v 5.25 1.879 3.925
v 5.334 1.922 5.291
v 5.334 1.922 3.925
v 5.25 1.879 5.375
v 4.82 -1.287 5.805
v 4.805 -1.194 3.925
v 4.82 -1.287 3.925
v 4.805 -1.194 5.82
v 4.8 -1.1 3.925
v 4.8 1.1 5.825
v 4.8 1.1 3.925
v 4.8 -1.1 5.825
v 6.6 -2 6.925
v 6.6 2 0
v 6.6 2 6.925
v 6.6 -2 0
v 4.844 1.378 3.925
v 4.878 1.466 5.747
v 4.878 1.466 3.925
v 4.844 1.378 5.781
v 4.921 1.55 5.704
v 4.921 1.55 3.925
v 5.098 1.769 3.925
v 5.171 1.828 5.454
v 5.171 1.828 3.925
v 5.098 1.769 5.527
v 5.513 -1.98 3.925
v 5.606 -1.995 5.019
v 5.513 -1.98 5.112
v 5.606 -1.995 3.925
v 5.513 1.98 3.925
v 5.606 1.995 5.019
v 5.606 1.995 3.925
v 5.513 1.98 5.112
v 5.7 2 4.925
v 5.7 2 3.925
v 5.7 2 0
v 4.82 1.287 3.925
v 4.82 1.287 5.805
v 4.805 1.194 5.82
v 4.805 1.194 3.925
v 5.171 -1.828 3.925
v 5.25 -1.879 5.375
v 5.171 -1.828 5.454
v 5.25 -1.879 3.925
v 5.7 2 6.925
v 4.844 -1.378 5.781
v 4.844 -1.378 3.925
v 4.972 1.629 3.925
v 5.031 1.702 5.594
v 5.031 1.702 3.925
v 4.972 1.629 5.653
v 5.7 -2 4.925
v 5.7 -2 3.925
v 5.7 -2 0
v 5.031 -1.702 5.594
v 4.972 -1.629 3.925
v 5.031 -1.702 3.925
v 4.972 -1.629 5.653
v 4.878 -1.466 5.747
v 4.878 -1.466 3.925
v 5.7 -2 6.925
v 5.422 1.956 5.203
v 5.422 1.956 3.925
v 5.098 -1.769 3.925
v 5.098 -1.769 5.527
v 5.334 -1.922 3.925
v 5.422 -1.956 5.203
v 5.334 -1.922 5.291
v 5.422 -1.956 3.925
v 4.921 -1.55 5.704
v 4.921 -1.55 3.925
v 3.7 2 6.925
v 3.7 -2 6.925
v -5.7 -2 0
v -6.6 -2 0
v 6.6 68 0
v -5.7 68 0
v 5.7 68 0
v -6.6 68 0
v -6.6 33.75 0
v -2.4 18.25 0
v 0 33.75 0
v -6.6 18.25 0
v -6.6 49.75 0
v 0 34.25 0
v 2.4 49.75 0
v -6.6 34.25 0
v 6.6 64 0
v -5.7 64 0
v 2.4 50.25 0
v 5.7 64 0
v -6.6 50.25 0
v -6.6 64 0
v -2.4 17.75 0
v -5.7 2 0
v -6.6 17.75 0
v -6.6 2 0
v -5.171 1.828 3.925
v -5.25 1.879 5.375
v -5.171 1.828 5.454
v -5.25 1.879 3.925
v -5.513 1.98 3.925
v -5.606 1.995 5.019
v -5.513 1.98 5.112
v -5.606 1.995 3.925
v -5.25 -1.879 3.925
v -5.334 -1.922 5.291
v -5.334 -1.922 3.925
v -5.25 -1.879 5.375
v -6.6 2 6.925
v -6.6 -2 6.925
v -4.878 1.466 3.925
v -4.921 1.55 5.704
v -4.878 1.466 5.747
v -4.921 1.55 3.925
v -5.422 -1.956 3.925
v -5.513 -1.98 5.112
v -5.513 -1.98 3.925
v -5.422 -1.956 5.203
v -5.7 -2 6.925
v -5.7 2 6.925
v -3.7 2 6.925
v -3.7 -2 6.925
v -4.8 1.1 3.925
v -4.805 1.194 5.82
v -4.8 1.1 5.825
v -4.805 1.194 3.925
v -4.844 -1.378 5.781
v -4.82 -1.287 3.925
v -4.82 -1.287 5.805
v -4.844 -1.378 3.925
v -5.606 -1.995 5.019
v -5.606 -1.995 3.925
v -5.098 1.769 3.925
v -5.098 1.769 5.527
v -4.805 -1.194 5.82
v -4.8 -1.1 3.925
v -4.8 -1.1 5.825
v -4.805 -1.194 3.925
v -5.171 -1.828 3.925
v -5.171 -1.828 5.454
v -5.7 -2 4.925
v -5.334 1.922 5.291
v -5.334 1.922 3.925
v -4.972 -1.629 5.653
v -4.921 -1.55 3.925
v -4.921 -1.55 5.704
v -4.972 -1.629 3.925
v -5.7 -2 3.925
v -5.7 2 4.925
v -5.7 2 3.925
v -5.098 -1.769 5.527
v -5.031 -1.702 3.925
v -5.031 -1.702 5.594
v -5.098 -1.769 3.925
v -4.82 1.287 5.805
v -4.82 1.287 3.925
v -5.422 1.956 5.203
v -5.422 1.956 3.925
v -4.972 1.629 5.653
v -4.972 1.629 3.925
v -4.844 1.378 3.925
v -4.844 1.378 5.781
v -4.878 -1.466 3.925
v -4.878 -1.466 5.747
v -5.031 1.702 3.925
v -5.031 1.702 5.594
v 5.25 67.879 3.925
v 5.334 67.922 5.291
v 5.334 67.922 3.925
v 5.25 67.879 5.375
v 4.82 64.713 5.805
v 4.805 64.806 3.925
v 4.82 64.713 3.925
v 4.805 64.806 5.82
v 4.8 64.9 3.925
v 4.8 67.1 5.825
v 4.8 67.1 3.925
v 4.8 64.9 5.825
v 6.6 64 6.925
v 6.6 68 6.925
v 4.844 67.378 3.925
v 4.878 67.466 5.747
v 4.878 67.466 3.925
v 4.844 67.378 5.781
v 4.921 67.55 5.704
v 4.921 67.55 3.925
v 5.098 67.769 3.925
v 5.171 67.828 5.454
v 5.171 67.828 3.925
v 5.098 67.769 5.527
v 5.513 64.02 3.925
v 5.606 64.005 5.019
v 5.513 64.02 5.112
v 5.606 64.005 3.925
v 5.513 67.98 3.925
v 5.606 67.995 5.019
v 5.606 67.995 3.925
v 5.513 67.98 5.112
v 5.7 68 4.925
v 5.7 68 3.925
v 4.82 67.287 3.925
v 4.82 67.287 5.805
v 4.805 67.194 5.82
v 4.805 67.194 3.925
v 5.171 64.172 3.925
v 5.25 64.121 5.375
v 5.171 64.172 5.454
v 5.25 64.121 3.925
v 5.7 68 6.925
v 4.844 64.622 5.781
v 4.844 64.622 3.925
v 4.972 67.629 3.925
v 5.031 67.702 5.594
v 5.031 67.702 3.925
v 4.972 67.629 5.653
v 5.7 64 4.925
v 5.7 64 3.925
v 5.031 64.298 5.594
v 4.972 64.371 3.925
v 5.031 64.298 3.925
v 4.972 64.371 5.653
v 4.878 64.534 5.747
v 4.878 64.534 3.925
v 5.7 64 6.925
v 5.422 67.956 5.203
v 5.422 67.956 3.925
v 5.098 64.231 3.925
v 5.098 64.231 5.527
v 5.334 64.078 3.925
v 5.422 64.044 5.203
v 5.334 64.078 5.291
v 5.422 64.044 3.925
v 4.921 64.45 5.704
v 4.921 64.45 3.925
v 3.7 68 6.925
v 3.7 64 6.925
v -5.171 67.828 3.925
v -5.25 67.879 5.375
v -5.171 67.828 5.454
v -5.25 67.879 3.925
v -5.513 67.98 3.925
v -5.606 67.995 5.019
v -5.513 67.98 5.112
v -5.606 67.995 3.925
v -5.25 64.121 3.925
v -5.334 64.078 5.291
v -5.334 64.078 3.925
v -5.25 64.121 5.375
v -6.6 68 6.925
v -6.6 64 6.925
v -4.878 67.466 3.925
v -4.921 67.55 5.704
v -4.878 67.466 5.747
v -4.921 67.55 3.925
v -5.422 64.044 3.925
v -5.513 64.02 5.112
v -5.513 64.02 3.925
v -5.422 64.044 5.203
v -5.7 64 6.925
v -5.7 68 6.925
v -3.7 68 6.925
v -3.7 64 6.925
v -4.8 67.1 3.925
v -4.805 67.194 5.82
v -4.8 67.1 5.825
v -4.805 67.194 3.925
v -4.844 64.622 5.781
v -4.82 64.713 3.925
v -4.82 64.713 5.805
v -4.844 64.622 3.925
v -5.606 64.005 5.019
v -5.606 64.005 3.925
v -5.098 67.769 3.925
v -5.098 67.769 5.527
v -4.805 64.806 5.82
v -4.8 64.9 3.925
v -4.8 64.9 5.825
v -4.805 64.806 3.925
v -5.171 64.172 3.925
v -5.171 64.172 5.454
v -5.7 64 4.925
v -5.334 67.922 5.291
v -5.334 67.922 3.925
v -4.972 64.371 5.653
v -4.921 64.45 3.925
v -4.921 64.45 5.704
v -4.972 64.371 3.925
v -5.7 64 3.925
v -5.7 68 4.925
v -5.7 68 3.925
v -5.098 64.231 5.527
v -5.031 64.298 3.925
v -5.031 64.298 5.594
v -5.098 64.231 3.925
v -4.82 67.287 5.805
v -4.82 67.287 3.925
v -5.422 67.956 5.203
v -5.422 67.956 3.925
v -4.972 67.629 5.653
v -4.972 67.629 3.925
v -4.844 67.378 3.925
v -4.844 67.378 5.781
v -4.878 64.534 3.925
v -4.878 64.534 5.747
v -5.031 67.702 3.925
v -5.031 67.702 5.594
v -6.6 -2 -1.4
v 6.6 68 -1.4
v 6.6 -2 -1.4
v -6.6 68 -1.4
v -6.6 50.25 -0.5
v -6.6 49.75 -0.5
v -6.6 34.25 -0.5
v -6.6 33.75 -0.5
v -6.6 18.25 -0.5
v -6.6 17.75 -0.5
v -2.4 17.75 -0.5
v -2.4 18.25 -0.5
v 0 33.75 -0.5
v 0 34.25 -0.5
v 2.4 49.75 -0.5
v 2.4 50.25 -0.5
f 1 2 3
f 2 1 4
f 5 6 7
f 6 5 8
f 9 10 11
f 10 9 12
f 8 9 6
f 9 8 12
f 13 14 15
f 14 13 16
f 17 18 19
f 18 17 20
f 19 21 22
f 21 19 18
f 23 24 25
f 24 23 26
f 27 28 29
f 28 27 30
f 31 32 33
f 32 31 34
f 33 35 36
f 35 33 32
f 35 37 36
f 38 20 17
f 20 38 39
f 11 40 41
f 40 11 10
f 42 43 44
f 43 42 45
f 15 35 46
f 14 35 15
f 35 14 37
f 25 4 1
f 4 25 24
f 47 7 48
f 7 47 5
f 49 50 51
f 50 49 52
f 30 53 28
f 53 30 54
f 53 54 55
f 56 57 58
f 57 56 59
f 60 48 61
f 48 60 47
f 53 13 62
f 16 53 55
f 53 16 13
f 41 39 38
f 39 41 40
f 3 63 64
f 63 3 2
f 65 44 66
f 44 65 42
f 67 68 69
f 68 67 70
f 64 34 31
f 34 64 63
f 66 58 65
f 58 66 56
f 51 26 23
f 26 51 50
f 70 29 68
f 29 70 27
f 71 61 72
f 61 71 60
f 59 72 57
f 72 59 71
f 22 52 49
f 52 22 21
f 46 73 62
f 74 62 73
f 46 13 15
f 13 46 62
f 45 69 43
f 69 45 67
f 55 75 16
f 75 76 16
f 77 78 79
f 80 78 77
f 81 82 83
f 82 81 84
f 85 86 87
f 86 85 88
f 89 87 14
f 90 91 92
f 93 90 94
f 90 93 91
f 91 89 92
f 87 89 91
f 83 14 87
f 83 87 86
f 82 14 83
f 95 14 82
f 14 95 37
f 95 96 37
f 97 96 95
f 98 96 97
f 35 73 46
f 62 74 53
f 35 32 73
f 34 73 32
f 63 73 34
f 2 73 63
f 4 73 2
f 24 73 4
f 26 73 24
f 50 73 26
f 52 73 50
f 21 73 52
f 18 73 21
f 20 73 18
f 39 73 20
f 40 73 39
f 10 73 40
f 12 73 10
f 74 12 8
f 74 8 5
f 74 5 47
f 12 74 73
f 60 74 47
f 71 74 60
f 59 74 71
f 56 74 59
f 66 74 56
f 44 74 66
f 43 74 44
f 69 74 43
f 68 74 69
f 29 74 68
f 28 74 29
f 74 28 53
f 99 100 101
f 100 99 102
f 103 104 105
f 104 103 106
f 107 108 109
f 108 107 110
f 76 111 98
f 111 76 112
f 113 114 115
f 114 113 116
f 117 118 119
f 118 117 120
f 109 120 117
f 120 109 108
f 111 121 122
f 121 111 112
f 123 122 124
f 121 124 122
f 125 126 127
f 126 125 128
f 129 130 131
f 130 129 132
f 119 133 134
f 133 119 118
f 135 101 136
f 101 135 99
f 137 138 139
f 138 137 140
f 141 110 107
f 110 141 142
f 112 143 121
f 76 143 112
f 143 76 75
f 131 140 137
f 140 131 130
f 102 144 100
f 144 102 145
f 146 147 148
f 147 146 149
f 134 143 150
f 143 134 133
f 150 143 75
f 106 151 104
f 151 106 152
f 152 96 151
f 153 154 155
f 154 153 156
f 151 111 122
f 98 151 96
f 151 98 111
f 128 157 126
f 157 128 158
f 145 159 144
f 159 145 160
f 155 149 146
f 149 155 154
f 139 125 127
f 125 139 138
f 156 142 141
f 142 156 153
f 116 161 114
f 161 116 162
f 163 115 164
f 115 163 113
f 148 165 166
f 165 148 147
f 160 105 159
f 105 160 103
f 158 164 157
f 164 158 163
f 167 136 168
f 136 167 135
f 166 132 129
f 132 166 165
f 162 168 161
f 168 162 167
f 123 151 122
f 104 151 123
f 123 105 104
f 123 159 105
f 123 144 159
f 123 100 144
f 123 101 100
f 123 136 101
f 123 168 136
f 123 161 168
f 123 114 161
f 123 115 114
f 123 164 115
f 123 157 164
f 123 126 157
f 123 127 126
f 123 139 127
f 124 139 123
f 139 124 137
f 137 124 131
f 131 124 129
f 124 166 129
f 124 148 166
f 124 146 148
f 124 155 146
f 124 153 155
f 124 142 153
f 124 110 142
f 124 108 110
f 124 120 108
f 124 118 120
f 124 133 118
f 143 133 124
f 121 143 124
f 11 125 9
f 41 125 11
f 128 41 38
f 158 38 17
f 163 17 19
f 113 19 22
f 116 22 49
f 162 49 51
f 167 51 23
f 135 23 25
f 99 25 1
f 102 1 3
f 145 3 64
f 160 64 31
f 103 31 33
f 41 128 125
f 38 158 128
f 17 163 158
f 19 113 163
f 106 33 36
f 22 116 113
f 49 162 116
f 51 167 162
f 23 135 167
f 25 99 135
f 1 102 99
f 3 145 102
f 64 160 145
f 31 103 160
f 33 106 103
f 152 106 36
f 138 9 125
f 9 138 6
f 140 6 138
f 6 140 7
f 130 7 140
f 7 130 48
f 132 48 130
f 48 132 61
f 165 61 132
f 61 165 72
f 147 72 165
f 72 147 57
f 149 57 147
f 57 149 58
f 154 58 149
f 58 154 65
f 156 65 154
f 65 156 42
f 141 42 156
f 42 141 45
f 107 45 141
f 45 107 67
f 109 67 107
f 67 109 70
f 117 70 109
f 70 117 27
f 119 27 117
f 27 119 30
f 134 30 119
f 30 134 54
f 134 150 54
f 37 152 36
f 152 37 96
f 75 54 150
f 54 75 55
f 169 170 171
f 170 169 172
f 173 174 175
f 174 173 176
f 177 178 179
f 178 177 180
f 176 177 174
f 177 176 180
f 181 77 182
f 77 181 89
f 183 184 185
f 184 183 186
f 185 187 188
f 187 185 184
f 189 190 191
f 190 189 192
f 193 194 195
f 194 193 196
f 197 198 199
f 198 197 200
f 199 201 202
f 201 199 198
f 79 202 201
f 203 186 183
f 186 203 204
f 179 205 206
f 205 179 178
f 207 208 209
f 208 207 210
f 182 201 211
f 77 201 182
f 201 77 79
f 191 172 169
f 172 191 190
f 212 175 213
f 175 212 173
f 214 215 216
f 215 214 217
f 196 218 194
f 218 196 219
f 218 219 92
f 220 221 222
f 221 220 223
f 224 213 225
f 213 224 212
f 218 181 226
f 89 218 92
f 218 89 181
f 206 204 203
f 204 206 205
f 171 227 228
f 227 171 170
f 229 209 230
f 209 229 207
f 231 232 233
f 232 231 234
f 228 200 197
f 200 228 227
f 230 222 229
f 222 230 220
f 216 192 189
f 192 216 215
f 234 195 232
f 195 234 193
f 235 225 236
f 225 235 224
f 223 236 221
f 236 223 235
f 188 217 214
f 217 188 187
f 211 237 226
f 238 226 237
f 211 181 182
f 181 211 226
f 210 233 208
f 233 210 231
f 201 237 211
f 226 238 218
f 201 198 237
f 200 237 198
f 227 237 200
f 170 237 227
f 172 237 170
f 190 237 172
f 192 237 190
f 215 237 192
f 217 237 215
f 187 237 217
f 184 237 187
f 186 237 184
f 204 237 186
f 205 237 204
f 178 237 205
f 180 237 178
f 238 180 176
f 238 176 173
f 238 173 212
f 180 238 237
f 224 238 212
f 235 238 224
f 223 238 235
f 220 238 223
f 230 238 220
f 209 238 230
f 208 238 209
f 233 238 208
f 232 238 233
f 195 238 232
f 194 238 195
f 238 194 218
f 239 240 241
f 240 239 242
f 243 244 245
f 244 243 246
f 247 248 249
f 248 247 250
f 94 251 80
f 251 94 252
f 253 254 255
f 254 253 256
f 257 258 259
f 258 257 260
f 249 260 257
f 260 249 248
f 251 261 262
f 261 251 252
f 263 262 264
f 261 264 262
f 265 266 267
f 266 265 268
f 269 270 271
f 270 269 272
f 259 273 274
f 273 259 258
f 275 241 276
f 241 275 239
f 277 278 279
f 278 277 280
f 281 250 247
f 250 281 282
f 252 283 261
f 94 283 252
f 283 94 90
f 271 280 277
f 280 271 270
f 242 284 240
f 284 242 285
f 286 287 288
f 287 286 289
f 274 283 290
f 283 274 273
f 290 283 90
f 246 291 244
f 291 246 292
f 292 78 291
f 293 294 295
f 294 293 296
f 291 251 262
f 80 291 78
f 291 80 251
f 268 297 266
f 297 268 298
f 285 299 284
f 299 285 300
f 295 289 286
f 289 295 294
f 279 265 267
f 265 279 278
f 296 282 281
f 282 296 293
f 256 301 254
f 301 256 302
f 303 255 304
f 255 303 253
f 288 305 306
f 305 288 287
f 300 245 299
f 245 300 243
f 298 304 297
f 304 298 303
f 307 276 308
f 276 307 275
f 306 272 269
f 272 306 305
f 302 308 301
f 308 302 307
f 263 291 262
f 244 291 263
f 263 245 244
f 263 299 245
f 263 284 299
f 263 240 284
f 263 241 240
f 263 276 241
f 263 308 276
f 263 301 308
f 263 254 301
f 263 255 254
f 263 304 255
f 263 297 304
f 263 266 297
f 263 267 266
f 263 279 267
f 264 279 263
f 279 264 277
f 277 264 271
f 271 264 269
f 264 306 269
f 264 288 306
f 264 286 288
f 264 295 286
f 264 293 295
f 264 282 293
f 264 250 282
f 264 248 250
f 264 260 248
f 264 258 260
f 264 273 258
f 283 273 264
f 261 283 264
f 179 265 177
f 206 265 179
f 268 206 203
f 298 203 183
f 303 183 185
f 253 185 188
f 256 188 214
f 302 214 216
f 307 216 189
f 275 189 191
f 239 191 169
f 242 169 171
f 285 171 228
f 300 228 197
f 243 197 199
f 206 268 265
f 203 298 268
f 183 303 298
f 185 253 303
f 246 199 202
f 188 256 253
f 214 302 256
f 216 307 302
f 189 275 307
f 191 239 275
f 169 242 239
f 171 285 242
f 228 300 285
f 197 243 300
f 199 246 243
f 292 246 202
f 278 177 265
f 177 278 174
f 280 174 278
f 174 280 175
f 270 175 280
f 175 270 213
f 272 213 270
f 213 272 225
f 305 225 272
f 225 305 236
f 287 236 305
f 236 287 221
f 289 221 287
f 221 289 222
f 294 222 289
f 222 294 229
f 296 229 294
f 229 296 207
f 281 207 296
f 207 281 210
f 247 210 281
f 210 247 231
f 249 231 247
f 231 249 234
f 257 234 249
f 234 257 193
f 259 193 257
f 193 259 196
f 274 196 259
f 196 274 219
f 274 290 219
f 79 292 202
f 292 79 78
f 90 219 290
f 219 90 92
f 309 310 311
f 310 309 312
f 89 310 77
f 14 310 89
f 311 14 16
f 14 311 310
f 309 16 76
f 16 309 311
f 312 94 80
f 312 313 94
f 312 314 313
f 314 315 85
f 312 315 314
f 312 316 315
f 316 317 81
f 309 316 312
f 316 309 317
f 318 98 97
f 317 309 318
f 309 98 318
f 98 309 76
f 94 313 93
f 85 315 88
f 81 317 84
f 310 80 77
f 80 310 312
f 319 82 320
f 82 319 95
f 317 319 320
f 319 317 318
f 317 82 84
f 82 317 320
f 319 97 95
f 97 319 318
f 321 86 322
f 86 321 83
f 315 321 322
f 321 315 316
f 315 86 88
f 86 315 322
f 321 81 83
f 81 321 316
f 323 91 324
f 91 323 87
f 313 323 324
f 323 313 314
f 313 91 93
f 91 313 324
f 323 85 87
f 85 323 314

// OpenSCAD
$empty = true;
include <jig.scad>;

difference() {
  plate(r=0){
    wire_mount_rounded(wires=sockets*2, high=true,clasp=true);

    // For the distance between the mounts to be equal to big_spacing, we should add wire_mount_length.
    // However, one end of the ribbon will already be cut, so by adding nothing and feeding to the end of
    // the mount, the last cut should be big_spacing from the end. In practice, the last bit of ribbon comes
    // up a bit short, so we split the difference and add half the mount length.
    translate([0,big_spacing*sockets + wire_mount_length/2,0])
      wire_mount_rounded(wires=sockets*2, high=true,clasp=true);
  }

  let(y=.5, z=.5)
    for (i=[1:sockets-1]) {
      translate([-(wire_mount_width +wire_width * sockets), i * big_spacing + wire_mount_length/2 - y/2, -z])
        cube([2*i*wire_width + wire_mount_width, y, z]);
    }
}
